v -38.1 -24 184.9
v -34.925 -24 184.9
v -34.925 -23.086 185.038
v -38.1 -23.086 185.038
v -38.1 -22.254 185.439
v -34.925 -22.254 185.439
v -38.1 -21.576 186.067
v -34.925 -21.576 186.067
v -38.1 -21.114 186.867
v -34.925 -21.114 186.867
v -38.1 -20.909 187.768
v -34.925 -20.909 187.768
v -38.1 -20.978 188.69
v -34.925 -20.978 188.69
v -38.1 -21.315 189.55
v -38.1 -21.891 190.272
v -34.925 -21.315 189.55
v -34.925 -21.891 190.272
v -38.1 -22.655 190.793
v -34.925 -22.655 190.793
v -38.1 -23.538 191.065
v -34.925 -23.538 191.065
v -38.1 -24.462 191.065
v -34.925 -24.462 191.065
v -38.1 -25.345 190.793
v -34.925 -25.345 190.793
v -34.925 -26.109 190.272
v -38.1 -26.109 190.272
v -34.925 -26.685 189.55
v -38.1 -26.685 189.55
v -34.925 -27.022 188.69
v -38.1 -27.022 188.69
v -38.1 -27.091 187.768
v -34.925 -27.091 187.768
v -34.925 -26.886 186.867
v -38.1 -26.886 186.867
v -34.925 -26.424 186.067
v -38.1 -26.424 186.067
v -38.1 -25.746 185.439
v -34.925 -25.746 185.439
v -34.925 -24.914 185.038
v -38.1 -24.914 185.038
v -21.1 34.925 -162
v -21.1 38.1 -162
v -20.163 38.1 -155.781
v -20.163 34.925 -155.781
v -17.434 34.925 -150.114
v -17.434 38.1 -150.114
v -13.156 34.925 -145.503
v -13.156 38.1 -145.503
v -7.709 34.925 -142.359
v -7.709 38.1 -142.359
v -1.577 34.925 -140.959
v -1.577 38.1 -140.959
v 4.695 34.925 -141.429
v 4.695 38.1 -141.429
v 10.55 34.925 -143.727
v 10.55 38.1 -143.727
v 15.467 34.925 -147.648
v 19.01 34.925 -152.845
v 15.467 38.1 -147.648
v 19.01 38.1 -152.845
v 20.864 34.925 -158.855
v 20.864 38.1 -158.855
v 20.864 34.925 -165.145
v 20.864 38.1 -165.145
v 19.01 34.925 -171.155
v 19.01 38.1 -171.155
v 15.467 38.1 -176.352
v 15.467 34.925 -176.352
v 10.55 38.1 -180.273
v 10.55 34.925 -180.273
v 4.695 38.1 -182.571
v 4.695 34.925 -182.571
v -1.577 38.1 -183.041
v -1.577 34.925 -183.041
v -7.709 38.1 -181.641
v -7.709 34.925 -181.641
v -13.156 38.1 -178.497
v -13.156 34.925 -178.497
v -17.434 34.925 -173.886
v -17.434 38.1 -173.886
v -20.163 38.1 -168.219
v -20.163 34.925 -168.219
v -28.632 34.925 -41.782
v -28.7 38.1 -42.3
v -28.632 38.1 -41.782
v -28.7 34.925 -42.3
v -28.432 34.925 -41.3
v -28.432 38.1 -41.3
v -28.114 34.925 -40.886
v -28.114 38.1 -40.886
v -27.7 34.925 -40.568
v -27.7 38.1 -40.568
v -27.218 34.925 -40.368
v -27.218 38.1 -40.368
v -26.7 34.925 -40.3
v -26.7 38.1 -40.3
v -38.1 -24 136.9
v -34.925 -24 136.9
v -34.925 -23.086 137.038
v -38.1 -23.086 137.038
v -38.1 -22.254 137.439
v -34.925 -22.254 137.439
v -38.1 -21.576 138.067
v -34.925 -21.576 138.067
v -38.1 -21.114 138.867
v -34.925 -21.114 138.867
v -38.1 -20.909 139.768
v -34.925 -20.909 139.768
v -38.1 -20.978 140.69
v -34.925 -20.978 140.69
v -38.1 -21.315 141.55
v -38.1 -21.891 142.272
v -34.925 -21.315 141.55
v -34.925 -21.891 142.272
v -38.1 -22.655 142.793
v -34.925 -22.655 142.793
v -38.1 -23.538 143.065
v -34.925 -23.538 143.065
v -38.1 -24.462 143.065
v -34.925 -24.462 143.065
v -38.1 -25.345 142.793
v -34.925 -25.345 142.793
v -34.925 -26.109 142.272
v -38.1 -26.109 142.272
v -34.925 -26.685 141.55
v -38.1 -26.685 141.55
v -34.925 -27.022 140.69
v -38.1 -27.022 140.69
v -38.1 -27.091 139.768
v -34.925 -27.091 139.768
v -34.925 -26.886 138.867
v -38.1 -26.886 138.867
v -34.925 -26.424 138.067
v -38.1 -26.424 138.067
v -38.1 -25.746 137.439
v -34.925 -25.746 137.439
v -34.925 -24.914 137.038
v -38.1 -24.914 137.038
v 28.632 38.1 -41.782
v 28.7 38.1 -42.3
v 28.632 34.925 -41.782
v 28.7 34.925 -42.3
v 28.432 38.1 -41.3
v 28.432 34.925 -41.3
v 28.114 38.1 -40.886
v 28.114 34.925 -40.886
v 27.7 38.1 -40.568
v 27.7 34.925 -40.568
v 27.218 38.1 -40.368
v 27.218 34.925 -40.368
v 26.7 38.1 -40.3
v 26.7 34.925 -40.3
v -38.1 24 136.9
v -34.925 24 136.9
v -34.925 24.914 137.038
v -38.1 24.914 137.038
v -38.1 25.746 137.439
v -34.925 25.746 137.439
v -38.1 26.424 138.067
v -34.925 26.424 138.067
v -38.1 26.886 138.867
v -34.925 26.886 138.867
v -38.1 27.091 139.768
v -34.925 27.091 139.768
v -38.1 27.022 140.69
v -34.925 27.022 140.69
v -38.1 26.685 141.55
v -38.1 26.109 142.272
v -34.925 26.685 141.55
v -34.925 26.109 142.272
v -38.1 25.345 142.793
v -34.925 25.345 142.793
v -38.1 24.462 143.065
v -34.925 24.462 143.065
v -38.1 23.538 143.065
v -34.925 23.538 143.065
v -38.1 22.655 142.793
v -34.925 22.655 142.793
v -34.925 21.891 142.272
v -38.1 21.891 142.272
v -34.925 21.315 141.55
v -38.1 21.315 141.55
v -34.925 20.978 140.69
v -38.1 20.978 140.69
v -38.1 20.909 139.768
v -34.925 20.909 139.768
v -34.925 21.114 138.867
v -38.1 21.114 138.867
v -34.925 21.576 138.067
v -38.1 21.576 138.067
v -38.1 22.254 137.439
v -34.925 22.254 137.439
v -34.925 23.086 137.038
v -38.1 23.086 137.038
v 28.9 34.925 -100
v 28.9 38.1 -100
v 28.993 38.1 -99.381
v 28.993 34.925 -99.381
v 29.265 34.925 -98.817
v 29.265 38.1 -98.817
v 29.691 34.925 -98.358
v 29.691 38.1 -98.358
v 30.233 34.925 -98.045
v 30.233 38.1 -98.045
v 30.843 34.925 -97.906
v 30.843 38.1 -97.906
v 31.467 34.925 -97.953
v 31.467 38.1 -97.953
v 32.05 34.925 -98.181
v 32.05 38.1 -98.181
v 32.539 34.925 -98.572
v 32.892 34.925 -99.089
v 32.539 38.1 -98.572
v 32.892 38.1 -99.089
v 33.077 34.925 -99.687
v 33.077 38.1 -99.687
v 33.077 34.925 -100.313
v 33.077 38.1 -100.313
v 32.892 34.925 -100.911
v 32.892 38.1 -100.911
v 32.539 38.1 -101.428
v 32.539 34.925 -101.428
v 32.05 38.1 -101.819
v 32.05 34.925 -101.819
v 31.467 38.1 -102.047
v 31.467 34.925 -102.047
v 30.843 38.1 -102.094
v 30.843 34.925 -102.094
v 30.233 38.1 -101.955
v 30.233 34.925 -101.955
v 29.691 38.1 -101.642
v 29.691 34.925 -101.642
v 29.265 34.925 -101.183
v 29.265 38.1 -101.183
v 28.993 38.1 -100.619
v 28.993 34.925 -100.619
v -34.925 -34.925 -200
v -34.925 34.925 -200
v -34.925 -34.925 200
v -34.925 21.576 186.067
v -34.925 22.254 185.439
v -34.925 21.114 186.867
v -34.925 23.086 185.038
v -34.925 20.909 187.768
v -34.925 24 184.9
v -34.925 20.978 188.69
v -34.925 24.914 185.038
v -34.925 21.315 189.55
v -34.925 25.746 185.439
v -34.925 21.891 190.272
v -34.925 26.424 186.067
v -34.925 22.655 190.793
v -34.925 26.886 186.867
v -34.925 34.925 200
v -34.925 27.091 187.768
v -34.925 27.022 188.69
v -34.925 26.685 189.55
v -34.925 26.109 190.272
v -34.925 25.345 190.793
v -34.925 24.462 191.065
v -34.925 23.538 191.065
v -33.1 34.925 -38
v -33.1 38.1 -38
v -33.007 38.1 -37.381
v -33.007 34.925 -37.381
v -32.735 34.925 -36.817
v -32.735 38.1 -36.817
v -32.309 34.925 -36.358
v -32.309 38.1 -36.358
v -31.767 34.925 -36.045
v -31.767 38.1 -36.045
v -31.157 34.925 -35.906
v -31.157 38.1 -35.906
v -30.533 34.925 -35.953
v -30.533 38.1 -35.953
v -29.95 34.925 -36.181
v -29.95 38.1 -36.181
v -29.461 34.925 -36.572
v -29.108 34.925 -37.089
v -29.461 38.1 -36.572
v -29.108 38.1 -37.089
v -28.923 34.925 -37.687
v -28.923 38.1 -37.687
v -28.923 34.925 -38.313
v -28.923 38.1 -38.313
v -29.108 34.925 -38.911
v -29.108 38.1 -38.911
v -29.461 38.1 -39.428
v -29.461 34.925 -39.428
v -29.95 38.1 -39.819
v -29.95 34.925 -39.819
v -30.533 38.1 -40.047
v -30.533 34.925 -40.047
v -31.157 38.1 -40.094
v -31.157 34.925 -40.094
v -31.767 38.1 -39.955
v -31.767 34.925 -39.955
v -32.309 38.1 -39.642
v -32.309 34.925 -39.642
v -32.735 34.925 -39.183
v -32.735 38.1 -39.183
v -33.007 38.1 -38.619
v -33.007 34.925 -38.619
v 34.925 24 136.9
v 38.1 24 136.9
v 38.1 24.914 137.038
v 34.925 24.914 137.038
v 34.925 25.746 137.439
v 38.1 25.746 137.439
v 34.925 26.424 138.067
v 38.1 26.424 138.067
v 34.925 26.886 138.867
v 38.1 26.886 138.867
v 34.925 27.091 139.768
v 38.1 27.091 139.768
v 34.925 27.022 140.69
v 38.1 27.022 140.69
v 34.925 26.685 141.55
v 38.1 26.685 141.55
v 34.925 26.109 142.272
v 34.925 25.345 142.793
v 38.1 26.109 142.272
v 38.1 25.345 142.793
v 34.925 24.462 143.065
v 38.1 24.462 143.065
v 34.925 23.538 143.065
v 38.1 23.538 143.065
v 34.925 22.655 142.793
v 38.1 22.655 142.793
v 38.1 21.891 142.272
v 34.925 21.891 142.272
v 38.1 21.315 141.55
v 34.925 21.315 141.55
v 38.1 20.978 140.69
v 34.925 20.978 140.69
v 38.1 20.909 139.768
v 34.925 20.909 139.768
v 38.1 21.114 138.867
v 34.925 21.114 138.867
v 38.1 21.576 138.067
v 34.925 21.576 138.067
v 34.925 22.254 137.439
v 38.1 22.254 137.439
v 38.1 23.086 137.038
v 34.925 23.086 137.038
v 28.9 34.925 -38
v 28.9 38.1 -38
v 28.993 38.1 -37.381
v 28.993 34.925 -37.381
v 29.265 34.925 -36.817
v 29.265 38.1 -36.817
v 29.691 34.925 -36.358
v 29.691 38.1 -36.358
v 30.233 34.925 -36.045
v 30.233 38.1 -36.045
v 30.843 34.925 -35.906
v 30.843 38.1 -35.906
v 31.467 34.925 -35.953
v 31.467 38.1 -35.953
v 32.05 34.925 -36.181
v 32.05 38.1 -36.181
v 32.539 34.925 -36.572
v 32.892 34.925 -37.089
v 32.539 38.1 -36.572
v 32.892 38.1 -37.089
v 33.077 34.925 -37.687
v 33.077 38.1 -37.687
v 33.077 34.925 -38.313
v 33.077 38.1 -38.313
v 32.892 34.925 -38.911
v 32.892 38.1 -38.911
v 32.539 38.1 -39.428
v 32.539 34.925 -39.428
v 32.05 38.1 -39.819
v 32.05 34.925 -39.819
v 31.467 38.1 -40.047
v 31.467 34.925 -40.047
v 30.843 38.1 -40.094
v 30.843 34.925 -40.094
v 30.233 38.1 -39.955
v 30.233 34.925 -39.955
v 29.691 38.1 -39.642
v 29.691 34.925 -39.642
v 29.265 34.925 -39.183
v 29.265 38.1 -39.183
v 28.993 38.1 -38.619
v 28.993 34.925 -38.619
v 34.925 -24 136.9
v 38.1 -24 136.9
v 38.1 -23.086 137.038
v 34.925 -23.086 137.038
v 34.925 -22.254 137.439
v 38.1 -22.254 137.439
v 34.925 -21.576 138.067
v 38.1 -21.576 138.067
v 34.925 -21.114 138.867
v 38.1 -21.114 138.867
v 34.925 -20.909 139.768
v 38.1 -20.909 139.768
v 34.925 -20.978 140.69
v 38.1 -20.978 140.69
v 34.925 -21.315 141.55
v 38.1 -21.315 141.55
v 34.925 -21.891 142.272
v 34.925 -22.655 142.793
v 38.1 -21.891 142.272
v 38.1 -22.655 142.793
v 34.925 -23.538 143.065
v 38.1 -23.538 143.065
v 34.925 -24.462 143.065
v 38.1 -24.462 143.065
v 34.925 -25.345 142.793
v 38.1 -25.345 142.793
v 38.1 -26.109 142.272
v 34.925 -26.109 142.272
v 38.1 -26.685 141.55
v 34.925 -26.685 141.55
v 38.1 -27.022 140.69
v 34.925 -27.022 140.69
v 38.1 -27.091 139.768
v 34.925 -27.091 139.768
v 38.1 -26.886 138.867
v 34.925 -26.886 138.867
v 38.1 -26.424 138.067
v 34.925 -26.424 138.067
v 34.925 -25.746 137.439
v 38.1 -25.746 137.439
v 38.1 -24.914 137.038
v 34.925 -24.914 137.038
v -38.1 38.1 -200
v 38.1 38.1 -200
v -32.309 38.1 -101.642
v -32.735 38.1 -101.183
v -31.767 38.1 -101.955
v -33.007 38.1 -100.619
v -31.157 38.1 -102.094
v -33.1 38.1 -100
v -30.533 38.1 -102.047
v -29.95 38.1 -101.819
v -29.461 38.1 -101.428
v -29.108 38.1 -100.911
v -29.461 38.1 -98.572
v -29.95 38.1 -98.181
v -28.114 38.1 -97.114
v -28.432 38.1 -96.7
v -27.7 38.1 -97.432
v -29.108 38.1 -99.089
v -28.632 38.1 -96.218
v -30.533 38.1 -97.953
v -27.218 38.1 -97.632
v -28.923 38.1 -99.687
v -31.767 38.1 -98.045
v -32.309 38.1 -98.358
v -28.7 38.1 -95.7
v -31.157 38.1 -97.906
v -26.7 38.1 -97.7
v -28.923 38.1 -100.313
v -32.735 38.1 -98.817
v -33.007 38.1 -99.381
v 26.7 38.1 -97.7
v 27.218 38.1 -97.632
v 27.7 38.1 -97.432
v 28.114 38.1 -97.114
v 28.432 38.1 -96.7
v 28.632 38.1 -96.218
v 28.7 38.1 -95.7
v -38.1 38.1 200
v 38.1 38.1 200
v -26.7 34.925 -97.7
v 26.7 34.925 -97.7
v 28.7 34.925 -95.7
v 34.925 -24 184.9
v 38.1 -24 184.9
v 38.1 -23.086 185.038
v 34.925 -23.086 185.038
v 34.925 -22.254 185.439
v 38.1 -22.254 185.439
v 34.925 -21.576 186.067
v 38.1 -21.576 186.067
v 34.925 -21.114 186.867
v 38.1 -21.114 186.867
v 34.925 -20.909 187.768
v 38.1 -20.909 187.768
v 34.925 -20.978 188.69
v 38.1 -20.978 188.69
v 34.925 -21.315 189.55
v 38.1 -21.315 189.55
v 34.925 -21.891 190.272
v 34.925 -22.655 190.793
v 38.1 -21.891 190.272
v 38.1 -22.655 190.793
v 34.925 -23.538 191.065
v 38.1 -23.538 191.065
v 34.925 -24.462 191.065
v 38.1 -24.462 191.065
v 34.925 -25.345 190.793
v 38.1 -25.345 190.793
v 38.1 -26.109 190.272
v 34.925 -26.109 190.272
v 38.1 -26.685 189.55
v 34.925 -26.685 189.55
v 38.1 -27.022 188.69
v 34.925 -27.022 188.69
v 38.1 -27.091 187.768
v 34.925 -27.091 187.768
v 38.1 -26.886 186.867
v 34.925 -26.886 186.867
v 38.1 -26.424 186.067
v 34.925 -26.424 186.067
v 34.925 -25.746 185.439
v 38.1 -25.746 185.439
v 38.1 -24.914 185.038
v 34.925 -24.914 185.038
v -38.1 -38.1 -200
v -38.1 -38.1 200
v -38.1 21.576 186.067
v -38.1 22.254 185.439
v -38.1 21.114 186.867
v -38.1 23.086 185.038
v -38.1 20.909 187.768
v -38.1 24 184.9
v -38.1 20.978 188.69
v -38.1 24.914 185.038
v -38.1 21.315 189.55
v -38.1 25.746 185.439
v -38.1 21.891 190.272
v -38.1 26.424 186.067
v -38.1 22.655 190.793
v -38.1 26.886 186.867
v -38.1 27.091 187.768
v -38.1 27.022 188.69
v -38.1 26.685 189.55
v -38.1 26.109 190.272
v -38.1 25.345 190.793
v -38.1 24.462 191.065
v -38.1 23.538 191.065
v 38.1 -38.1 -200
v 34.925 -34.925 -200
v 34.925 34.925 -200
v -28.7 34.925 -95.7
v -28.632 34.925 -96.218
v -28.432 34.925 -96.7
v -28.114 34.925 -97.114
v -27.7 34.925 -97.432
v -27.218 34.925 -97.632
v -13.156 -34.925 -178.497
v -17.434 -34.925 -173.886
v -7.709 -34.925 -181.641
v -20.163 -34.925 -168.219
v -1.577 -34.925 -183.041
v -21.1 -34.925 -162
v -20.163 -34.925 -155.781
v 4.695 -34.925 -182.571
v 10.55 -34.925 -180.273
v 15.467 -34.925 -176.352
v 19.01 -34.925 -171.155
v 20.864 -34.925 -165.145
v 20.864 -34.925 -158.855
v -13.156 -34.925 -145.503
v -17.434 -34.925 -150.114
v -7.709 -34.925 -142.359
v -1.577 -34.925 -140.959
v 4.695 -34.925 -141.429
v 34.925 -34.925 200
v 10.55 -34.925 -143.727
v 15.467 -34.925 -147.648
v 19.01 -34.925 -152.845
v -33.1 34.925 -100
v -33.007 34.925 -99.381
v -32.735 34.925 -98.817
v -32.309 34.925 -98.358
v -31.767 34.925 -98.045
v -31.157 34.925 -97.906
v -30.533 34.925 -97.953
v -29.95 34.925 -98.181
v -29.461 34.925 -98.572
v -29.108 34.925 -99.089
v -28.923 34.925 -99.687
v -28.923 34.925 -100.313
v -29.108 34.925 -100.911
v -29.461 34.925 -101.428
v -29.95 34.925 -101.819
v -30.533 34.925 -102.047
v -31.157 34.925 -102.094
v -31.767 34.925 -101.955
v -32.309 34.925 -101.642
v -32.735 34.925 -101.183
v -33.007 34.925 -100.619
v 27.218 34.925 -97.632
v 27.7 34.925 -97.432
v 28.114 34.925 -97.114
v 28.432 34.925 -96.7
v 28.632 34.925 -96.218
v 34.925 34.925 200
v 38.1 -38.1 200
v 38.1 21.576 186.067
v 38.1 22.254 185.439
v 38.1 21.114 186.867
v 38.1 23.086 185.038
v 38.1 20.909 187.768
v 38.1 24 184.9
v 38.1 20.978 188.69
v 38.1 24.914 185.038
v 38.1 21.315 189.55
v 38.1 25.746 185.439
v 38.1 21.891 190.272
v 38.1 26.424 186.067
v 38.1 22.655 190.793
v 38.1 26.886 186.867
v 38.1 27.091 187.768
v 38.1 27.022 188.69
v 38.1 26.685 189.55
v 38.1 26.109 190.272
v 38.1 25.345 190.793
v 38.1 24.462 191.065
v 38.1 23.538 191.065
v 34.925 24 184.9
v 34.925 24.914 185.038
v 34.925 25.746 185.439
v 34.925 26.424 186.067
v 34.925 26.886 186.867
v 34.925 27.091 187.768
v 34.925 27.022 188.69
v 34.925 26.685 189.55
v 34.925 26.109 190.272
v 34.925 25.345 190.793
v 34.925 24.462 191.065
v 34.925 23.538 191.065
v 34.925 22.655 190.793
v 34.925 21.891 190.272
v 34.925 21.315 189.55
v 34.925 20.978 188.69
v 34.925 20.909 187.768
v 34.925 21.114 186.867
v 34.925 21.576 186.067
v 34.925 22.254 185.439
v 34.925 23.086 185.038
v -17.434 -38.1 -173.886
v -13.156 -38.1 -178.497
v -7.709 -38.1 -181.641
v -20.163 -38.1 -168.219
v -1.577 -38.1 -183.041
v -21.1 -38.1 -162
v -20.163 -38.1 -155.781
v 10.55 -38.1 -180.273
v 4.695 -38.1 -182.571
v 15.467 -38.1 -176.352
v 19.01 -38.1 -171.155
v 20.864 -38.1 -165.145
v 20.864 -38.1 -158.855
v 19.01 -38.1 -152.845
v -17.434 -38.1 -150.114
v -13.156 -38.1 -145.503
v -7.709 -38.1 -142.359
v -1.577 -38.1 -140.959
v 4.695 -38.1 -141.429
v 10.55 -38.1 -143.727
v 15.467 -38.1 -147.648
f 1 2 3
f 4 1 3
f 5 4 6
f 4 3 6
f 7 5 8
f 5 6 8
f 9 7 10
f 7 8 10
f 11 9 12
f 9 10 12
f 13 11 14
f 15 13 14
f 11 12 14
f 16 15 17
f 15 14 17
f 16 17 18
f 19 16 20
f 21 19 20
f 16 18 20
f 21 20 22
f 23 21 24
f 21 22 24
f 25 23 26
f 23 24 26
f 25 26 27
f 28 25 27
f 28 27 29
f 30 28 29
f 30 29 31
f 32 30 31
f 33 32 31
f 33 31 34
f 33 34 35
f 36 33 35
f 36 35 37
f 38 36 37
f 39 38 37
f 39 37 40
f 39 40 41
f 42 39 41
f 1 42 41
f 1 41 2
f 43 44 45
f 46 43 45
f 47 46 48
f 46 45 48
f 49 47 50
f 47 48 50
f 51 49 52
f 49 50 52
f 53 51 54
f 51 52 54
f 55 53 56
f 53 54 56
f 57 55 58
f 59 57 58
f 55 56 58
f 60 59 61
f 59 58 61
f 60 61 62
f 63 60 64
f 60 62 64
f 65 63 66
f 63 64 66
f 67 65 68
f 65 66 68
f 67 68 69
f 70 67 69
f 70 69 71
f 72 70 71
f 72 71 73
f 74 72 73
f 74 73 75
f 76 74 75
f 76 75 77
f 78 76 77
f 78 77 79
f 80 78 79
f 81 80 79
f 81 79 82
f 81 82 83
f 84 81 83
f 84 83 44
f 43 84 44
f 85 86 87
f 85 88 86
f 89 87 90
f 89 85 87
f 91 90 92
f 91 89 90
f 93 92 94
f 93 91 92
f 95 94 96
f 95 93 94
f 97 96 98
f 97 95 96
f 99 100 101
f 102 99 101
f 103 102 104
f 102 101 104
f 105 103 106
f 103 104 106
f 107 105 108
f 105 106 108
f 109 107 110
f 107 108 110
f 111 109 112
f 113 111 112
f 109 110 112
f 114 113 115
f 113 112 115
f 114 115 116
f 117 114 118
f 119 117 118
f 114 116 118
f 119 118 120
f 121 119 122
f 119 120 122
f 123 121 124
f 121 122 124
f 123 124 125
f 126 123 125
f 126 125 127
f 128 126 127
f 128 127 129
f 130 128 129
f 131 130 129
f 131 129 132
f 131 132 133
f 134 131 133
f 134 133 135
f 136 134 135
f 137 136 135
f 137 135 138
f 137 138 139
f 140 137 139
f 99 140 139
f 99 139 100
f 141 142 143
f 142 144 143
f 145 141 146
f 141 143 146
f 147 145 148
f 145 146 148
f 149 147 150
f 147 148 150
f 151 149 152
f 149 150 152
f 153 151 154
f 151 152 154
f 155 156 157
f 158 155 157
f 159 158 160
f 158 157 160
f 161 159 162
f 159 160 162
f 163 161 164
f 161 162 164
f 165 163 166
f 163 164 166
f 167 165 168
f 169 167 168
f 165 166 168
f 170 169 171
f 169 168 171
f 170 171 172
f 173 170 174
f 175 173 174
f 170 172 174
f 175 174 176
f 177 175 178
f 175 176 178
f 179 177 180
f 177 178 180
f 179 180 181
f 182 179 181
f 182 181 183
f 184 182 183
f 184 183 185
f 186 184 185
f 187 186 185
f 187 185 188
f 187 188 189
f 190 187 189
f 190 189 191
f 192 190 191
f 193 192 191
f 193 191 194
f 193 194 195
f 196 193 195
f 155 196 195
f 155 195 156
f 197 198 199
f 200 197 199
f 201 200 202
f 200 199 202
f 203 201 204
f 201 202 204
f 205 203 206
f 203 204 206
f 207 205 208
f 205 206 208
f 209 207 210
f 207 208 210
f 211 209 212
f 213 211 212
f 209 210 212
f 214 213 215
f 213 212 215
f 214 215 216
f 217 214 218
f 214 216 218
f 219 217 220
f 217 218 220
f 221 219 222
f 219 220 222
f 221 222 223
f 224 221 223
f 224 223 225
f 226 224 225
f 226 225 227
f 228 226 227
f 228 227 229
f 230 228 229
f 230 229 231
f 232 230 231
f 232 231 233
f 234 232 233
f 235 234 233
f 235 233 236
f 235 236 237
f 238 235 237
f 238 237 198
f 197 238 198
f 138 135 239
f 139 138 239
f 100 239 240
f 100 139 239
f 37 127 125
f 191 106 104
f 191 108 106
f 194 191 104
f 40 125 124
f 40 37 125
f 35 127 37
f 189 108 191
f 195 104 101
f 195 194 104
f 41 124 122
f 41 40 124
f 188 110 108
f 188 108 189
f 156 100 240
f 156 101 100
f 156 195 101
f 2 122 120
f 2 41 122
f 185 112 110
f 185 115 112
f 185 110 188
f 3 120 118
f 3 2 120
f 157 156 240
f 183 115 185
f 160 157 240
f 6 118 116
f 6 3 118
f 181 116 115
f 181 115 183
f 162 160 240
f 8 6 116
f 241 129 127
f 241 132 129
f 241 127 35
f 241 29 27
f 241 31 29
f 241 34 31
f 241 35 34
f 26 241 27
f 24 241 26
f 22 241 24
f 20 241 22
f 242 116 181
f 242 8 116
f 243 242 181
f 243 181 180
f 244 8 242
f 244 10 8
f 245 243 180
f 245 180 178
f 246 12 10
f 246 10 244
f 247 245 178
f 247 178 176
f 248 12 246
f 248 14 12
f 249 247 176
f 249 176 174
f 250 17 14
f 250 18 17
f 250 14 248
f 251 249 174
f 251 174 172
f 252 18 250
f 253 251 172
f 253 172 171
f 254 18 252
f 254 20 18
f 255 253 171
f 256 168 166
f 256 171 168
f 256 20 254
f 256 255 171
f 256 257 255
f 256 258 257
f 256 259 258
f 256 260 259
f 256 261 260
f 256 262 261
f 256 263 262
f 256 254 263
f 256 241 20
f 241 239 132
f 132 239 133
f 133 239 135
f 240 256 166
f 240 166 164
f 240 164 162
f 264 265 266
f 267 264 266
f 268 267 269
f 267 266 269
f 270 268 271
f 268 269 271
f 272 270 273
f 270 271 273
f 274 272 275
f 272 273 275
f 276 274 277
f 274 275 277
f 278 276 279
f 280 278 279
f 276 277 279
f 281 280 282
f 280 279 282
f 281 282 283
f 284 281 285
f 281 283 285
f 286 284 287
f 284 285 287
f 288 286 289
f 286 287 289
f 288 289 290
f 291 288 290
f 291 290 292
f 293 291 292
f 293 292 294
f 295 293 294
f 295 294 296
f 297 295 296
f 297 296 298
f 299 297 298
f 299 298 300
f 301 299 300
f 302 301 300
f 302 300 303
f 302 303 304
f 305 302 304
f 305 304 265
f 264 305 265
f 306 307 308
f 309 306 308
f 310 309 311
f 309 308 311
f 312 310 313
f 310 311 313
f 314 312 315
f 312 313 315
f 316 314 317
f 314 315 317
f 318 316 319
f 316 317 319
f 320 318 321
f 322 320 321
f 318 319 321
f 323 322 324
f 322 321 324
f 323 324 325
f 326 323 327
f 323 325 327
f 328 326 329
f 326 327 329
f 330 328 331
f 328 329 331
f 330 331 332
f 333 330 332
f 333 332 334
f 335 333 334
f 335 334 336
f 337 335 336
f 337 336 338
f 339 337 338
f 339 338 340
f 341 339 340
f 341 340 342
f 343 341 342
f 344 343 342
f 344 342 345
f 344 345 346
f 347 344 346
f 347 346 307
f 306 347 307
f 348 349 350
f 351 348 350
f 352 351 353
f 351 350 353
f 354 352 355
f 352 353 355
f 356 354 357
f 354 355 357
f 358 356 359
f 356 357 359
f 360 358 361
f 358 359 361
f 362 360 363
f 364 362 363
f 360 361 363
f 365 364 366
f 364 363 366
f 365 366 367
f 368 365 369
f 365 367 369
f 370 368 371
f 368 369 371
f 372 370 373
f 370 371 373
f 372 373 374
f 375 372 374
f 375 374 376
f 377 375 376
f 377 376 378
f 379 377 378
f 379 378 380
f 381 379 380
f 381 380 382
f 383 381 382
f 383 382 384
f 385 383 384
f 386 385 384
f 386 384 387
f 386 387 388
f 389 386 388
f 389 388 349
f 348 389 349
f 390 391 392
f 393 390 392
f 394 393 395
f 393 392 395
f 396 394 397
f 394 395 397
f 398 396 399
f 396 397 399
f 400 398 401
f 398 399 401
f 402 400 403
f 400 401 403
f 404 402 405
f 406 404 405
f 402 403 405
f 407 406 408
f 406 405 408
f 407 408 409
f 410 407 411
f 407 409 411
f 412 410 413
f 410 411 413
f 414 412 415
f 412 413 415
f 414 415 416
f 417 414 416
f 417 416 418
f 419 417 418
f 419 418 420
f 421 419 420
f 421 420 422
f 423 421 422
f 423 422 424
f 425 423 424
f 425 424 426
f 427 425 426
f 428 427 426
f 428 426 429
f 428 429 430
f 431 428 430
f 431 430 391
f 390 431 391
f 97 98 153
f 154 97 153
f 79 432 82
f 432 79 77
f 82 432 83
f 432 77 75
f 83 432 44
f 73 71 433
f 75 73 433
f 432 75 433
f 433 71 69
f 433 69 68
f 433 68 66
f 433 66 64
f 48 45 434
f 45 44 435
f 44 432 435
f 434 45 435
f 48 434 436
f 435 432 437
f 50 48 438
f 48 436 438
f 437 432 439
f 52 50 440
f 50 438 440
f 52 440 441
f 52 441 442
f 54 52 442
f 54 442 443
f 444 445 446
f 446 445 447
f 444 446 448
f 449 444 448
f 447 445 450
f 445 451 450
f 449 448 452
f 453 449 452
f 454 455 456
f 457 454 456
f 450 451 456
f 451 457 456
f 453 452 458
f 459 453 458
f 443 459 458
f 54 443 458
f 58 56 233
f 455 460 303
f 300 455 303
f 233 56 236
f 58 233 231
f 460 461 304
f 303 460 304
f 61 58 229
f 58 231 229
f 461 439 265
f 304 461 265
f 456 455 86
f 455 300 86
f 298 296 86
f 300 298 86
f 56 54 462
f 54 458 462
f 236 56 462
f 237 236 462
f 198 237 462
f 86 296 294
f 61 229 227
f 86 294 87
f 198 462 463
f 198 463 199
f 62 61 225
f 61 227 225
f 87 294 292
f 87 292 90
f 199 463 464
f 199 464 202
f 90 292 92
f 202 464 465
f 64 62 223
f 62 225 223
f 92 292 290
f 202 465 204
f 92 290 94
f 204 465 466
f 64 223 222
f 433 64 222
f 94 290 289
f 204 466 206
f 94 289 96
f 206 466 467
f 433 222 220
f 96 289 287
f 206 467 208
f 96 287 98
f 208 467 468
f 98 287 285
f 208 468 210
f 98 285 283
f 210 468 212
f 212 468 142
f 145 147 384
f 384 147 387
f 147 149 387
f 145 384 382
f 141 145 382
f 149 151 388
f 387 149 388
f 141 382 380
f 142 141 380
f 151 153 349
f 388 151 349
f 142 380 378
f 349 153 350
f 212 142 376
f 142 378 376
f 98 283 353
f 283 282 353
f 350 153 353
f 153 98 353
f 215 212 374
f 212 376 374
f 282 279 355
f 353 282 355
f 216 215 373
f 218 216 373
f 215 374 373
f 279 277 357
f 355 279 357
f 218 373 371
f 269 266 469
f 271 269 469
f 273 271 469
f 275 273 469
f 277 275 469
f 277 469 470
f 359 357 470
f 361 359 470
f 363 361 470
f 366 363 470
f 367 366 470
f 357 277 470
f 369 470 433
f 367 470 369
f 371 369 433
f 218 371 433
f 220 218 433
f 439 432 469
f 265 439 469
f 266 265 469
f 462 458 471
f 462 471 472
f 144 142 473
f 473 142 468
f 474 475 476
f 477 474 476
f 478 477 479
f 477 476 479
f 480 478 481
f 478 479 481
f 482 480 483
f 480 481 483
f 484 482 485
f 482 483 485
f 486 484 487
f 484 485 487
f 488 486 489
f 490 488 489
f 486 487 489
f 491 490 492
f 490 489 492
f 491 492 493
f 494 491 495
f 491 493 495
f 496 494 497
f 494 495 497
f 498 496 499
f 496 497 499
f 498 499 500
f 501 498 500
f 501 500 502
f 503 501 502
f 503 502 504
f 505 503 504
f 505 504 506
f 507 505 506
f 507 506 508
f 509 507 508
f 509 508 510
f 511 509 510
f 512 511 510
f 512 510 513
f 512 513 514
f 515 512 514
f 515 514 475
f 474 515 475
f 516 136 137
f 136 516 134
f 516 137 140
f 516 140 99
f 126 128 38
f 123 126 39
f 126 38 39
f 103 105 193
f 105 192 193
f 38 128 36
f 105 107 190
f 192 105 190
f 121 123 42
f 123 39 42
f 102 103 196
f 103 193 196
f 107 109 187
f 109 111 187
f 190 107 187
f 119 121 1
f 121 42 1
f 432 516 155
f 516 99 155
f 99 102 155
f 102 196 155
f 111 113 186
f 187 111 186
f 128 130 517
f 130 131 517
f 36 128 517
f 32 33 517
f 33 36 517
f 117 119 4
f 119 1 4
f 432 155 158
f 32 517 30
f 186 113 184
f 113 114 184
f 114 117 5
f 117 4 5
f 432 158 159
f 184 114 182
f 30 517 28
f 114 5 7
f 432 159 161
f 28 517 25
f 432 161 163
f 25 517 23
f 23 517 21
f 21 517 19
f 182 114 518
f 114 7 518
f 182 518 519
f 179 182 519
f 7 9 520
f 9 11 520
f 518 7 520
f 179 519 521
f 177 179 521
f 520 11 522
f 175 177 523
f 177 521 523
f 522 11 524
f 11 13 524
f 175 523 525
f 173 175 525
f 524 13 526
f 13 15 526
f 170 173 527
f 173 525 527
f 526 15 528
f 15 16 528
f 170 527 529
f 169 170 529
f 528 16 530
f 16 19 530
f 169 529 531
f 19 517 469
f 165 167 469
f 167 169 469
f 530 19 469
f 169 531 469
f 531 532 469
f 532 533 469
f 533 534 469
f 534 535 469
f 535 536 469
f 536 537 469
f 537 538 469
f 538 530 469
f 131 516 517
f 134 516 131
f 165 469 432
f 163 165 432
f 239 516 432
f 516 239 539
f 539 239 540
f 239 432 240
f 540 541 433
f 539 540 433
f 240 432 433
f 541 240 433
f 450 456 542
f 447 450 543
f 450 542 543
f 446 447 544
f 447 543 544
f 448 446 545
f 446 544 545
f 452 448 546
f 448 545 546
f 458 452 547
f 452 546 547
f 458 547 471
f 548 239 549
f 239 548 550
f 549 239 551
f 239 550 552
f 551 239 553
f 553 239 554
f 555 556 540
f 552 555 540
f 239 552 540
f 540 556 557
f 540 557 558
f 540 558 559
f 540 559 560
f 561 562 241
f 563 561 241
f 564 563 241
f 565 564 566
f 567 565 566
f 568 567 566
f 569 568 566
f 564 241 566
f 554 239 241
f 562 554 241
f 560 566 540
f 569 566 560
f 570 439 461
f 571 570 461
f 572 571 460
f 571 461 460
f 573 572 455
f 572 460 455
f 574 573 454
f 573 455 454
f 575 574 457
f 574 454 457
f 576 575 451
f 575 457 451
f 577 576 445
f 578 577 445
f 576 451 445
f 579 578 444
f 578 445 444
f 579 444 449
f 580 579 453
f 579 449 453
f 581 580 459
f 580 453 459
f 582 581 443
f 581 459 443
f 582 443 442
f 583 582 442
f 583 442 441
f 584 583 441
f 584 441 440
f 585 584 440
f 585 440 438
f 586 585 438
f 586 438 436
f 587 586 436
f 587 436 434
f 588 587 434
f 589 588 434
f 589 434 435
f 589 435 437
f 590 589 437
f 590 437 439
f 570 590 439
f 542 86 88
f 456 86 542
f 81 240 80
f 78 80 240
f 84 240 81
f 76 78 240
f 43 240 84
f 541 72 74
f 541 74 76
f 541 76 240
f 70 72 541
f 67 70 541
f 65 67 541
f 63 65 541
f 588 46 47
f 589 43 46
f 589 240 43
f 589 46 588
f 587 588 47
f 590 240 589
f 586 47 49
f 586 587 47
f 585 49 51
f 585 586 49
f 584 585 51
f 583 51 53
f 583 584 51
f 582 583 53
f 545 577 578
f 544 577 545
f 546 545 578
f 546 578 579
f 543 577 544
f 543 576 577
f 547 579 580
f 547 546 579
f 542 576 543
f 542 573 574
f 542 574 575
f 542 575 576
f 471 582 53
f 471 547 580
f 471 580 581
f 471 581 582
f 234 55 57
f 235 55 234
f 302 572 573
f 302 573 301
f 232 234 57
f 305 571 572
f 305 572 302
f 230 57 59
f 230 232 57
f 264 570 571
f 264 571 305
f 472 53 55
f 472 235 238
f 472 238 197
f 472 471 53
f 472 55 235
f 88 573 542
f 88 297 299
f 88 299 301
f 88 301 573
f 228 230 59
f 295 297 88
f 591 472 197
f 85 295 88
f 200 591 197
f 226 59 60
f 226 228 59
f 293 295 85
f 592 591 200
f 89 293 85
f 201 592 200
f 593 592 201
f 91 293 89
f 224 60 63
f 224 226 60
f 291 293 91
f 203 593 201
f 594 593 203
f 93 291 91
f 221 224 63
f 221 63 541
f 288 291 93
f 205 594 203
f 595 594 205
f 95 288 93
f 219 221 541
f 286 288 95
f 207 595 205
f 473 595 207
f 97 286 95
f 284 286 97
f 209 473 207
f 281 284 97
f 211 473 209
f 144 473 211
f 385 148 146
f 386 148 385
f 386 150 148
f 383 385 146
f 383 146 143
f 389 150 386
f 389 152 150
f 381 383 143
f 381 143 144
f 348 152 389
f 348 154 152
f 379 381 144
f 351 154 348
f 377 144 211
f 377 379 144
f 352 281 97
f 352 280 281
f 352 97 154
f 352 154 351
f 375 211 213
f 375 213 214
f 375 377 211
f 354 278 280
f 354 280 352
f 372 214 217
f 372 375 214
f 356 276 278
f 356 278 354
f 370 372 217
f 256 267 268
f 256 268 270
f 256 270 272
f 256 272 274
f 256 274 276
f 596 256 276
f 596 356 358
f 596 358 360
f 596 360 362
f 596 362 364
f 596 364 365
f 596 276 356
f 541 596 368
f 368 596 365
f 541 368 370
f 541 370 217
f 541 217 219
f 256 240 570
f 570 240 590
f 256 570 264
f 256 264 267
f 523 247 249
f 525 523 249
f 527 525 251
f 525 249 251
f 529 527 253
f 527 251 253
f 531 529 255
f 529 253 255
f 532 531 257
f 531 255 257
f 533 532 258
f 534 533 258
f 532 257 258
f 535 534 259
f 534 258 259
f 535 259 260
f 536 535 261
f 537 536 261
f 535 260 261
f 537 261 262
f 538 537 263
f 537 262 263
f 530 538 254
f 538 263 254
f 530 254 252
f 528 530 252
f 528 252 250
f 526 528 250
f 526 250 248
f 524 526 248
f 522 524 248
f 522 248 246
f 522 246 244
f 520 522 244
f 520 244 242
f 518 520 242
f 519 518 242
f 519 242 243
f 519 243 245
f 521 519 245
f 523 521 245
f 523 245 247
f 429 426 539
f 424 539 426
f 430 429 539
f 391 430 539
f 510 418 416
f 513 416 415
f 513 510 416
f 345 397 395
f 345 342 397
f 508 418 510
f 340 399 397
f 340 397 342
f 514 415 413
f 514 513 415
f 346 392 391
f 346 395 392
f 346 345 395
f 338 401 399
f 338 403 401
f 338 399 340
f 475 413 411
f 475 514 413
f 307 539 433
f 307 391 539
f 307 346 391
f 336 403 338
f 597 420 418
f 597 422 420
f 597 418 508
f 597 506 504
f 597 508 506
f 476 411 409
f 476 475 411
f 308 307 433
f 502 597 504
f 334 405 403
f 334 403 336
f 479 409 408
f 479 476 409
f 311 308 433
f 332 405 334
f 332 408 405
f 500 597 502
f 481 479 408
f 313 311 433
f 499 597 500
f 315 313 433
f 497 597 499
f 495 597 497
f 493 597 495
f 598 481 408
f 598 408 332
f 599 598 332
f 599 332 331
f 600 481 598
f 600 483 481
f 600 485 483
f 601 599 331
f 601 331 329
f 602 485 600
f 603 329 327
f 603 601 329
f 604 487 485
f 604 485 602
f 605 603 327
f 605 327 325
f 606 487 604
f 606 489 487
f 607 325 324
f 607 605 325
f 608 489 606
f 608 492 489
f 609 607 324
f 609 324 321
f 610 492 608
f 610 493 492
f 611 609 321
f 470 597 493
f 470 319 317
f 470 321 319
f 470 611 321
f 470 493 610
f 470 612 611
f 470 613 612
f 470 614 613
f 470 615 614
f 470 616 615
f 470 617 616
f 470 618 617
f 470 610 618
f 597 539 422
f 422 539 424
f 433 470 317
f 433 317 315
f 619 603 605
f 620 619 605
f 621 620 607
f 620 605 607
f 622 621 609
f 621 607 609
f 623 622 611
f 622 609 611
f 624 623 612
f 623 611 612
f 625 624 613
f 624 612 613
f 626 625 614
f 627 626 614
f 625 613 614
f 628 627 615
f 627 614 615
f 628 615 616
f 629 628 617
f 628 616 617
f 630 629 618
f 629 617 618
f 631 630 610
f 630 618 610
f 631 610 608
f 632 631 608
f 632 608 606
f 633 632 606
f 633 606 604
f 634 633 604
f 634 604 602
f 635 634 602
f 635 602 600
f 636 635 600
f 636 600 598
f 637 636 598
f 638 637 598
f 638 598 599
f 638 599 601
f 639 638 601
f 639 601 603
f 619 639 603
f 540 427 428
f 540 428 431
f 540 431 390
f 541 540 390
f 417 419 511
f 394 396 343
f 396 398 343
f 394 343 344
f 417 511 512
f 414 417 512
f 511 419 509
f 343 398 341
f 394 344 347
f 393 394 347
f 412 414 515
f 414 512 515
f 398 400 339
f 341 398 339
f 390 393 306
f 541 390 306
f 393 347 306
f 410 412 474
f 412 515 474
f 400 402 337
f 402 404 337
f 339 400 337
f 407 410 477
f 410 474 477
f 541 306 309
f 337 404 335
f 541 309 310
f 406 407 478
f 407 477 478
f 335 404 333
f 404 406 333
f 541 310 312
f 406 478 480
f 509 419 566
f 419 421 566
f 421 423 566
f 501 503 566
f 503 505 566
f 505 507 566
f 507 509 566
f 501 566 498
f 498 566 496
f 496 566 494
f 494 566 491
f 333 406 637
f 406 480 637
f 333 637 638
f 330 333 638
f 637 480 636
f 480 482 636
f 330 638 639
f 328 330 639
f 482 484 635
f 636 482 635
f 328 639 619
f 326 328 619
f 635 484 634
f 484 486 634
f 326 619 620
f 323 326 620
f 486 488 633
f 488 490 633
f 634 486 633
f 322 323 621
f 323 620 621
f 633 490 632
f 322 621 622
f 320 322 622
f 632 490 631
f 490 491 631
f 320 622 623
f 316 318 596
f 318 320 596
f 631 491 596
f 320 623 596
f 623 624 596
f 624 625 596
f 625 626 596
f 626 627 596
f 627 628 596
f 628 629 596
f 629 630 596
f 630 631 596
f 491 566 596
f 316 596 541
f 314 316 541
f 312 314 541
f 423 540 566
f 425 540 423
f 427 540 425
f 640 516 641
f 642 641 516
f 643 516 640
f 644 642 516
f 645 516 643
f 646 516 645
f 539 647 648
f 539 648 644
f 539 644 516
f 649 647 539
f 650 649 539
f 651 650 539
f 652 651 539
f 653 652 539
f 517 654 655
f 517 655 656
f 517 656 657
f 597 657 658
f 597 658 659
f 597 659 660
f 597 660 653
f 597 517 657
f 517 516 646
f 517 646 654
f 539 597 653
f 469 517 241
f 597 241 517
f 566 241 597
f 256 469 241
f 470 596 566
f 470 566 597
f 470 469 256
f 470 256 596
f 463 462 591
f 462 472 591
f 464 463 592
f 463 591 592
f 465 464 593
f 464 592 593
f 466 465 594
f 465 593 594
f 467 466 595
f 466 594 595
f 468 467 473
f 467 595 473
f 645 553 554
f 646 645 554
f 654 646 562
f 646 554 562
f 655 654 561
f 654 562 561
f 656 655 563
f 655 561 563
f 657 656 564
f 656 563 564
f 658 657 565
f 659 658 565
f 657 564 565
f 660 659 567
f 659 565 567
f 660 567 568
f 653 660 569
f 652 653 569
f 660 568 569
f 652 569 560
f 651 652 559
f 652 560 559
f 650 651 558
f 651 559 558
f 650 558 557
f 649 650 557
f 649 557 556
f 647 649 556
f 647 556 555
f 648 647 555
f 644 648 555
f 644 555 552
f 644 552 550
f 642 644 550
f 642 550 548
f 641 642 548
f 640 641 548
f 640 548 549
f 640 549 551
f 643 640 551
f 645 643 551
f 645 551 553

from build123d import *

# Parameters (mm, degrees)
SKETCH1_W           = 76.2
SKETCH1_H           = 76.2
SKETCH1_W_2         = 69.85
SKETCH1_H_2         = 69.85
BOSS_EXTRUDE1_DEPTH = 200
SKETCH4_R           = 3.1
CUT_EXTRUDE2_DEPTH  = 218.389167163
CUT_EXTRUDE3_REACH  = 219.389
SKETCH5_R           = 2.1
SKETCH5_W           = 57.4
SKETCH5_H           = 57.4
FILLET1_R           = 2
SKETCH6_R           = 21.1
CUT_EXTRUDE4_DEPTH  = 218.389167163


with BuildPart() as part:
    # Sketch1 → Boss-Extrude1 (new, symmetric)
    with BuildSketch(Plane.XY):
        Rectangle(SKETCH1_W, SKETCH1_H)
        Rectangle(SKETCH1_W_2, SKETCH1_H_2, mode=Mode.SUBTRACT)
    extrude(amount=BOSS_EXTRUDE1_DEPTH, both=True)

    # Sketch4 → Cut-Extrude2 (cut, through all)
    with BuildSketch(Plane(origin=(38.1, 0, 0), x_dir=(0, 0, -1), z_dir=(1, 0, 0))):
        with Locations((-140, 24)):
            Circle(SKETCH4_R)
        with Locations((-188, 24)):
            Circle(SKETCH4_R)
        with Locations((-140, -24)):
            Circle(SKETCH4_R)
        with Locations((-188, -24)):
            Circle(SKETCH4_R)
    extrude(amount=-CUT_EXTRUDE2_DEPTH, mode=Mode.SUBTRACT)

    # Sketch5 → Cut-Extrude3 (cut, up to next)
    with BuildSketch(Plane(origin=(0, 38.1, 0), x_dir=(1, 0, 0), z_dir=(0, 1, 0)), mode=Mode.PRIVATE) as cut_extrude3_sk1:
        with Locations(Location((31, 38, 0), (0, 0, 180))):
            Circle(SKETCH5_R)
    cut_extrude3_tool1 = extrude(cut_extrude3_sk1.sketch, amount=-CUT_EXTRUDE3_REACH, mode=Mode.PRIVATE) & part.part
    # Sketch5 → Cut-Extrude3 (cut, up to next)
    with BuildSketch(Plane(origin=(0, 38.1, 0), x_dir=(1, 0, 0), z_dir=(0, 1, 0)), mode=Mode.PRIVATE) as cut_extrude3_sk2:
        with Locations(Location((-31, 100, 0), (0, 0, 180))):
            Circle(SKETCH5_R)
    cut_extrude3_tool2 = extrude(cut_extrude3_sk2.sketch, amount=-CUT_EXTRUDE3_REACH, mode=Mode.PRIVATE) & part.part
    # Sketch5 → Cut-Extrude3 (cut, up to next)
    with BuildSketch(Plane(origin=(0, 38.1, 0), x_dir=(1, 0, 0), z_dir=(0, 1, 0)), mode=Mode.PRIVATE) as cut_extrude3_sk3:
        with Locations(Location((-31, 38, 0), (0, 0, 180))):
            Circle(SKETCH5_R)
    cut_extrude3_tool3 = extrude(cut_extrude3_sk3.sketch, amount=-CUT_EXTRUDE3_REACH, mode=Mode.PRIVATE) & part.part
    # Sketch5 → Cut-Extrude3 (cut, up to next)
    with BuildSketch(Plane(origin=(0, 38.1, 0), x_dir=(1, 0, 0), z_dir=(0, 1, 0)), mode=Mode.PRIVATE) as cut_extrude3_sk4:
        with Locations(Location((31, 100, 0), (0, 0, 180))):
            Circle(SKETCH5_R)
    cut_extrude3_tool4 = extrude(cut_extrude3_sk4.sketch, amount=-CUT_EXTRUDE3_REACH, mode=Mode.PRIVATE) & part.part
    # Sketch5 → Cut-Extrude3 (cut, up to next)
    with BuildSketch(Plane(origin=(0, 38.1, 0), x_dir=(1, 0, 0), z_dir=(0, 1, 0)), mode=Mode.PRIVATE) as cut_extrude3_sk5:
        with Locations((0, 69)):
            Rectangle(SKETCH5_W, SKETCH5_H)
    cut_extrude3_tool5 = extrude(cut_extrude3_sk5.sketch, amount=-CUT_EXTRUDE3_REACH, mode=Mode.PRIVATE) & part.part
    add(cut_extrude3_tool1.solids().sort_by_distance((31, 38.1, -38))[0], mode=Mode.SUBTRACT)
    add(cut_extrude3_tool2.solids().sort_by_distance((-31, 38.1, -100))[0], mode=Mode.SUBTRACT)
    add(cut_extrude3_tool3.solids().sort_by_distance((-31, 38.1, -38))[0], mode=Mode.SUBTRACT)
    add(cut_extrude3_tool4.solids().sort_by_distance((31, 38.1, -100))[0], mode=Mode.SUBTRACT)
    add(cut_extrude3_tool5.solids().sort_by_distance((0, 38.1, -69))[0], mode=Mode.SUBTRACT)

    # Fillet1
    fillet1_edges = [part.edges().sort_by_distance(p)[0] for p in [
        (28.7, 36.5125, -97.7),
        (-28.7, 36.5125, -97.7),
        (-28.7, 36.5125, -40.3),
        (28.7, 36.5125, -40.3),
    ]]
    fillet(fillet1_edges, radius=FILLET1_R)

    # Sketch6 → Cut-Extrude4 (cut, through all)
    with BuildSketch(Plane(origin=(0, 38.1, 0), x_dir=(1, 0, 0), z_dir=(0, 1, 0))):
        with Locations(Location((0, 162, 0), (0, 0, 180))):
            Circle(SKETCH6_R)
    extrude(amount=-CUT_EXTRUDE4_DEPTH, mode=Mode.SUBTRACT)


solid = part.part
